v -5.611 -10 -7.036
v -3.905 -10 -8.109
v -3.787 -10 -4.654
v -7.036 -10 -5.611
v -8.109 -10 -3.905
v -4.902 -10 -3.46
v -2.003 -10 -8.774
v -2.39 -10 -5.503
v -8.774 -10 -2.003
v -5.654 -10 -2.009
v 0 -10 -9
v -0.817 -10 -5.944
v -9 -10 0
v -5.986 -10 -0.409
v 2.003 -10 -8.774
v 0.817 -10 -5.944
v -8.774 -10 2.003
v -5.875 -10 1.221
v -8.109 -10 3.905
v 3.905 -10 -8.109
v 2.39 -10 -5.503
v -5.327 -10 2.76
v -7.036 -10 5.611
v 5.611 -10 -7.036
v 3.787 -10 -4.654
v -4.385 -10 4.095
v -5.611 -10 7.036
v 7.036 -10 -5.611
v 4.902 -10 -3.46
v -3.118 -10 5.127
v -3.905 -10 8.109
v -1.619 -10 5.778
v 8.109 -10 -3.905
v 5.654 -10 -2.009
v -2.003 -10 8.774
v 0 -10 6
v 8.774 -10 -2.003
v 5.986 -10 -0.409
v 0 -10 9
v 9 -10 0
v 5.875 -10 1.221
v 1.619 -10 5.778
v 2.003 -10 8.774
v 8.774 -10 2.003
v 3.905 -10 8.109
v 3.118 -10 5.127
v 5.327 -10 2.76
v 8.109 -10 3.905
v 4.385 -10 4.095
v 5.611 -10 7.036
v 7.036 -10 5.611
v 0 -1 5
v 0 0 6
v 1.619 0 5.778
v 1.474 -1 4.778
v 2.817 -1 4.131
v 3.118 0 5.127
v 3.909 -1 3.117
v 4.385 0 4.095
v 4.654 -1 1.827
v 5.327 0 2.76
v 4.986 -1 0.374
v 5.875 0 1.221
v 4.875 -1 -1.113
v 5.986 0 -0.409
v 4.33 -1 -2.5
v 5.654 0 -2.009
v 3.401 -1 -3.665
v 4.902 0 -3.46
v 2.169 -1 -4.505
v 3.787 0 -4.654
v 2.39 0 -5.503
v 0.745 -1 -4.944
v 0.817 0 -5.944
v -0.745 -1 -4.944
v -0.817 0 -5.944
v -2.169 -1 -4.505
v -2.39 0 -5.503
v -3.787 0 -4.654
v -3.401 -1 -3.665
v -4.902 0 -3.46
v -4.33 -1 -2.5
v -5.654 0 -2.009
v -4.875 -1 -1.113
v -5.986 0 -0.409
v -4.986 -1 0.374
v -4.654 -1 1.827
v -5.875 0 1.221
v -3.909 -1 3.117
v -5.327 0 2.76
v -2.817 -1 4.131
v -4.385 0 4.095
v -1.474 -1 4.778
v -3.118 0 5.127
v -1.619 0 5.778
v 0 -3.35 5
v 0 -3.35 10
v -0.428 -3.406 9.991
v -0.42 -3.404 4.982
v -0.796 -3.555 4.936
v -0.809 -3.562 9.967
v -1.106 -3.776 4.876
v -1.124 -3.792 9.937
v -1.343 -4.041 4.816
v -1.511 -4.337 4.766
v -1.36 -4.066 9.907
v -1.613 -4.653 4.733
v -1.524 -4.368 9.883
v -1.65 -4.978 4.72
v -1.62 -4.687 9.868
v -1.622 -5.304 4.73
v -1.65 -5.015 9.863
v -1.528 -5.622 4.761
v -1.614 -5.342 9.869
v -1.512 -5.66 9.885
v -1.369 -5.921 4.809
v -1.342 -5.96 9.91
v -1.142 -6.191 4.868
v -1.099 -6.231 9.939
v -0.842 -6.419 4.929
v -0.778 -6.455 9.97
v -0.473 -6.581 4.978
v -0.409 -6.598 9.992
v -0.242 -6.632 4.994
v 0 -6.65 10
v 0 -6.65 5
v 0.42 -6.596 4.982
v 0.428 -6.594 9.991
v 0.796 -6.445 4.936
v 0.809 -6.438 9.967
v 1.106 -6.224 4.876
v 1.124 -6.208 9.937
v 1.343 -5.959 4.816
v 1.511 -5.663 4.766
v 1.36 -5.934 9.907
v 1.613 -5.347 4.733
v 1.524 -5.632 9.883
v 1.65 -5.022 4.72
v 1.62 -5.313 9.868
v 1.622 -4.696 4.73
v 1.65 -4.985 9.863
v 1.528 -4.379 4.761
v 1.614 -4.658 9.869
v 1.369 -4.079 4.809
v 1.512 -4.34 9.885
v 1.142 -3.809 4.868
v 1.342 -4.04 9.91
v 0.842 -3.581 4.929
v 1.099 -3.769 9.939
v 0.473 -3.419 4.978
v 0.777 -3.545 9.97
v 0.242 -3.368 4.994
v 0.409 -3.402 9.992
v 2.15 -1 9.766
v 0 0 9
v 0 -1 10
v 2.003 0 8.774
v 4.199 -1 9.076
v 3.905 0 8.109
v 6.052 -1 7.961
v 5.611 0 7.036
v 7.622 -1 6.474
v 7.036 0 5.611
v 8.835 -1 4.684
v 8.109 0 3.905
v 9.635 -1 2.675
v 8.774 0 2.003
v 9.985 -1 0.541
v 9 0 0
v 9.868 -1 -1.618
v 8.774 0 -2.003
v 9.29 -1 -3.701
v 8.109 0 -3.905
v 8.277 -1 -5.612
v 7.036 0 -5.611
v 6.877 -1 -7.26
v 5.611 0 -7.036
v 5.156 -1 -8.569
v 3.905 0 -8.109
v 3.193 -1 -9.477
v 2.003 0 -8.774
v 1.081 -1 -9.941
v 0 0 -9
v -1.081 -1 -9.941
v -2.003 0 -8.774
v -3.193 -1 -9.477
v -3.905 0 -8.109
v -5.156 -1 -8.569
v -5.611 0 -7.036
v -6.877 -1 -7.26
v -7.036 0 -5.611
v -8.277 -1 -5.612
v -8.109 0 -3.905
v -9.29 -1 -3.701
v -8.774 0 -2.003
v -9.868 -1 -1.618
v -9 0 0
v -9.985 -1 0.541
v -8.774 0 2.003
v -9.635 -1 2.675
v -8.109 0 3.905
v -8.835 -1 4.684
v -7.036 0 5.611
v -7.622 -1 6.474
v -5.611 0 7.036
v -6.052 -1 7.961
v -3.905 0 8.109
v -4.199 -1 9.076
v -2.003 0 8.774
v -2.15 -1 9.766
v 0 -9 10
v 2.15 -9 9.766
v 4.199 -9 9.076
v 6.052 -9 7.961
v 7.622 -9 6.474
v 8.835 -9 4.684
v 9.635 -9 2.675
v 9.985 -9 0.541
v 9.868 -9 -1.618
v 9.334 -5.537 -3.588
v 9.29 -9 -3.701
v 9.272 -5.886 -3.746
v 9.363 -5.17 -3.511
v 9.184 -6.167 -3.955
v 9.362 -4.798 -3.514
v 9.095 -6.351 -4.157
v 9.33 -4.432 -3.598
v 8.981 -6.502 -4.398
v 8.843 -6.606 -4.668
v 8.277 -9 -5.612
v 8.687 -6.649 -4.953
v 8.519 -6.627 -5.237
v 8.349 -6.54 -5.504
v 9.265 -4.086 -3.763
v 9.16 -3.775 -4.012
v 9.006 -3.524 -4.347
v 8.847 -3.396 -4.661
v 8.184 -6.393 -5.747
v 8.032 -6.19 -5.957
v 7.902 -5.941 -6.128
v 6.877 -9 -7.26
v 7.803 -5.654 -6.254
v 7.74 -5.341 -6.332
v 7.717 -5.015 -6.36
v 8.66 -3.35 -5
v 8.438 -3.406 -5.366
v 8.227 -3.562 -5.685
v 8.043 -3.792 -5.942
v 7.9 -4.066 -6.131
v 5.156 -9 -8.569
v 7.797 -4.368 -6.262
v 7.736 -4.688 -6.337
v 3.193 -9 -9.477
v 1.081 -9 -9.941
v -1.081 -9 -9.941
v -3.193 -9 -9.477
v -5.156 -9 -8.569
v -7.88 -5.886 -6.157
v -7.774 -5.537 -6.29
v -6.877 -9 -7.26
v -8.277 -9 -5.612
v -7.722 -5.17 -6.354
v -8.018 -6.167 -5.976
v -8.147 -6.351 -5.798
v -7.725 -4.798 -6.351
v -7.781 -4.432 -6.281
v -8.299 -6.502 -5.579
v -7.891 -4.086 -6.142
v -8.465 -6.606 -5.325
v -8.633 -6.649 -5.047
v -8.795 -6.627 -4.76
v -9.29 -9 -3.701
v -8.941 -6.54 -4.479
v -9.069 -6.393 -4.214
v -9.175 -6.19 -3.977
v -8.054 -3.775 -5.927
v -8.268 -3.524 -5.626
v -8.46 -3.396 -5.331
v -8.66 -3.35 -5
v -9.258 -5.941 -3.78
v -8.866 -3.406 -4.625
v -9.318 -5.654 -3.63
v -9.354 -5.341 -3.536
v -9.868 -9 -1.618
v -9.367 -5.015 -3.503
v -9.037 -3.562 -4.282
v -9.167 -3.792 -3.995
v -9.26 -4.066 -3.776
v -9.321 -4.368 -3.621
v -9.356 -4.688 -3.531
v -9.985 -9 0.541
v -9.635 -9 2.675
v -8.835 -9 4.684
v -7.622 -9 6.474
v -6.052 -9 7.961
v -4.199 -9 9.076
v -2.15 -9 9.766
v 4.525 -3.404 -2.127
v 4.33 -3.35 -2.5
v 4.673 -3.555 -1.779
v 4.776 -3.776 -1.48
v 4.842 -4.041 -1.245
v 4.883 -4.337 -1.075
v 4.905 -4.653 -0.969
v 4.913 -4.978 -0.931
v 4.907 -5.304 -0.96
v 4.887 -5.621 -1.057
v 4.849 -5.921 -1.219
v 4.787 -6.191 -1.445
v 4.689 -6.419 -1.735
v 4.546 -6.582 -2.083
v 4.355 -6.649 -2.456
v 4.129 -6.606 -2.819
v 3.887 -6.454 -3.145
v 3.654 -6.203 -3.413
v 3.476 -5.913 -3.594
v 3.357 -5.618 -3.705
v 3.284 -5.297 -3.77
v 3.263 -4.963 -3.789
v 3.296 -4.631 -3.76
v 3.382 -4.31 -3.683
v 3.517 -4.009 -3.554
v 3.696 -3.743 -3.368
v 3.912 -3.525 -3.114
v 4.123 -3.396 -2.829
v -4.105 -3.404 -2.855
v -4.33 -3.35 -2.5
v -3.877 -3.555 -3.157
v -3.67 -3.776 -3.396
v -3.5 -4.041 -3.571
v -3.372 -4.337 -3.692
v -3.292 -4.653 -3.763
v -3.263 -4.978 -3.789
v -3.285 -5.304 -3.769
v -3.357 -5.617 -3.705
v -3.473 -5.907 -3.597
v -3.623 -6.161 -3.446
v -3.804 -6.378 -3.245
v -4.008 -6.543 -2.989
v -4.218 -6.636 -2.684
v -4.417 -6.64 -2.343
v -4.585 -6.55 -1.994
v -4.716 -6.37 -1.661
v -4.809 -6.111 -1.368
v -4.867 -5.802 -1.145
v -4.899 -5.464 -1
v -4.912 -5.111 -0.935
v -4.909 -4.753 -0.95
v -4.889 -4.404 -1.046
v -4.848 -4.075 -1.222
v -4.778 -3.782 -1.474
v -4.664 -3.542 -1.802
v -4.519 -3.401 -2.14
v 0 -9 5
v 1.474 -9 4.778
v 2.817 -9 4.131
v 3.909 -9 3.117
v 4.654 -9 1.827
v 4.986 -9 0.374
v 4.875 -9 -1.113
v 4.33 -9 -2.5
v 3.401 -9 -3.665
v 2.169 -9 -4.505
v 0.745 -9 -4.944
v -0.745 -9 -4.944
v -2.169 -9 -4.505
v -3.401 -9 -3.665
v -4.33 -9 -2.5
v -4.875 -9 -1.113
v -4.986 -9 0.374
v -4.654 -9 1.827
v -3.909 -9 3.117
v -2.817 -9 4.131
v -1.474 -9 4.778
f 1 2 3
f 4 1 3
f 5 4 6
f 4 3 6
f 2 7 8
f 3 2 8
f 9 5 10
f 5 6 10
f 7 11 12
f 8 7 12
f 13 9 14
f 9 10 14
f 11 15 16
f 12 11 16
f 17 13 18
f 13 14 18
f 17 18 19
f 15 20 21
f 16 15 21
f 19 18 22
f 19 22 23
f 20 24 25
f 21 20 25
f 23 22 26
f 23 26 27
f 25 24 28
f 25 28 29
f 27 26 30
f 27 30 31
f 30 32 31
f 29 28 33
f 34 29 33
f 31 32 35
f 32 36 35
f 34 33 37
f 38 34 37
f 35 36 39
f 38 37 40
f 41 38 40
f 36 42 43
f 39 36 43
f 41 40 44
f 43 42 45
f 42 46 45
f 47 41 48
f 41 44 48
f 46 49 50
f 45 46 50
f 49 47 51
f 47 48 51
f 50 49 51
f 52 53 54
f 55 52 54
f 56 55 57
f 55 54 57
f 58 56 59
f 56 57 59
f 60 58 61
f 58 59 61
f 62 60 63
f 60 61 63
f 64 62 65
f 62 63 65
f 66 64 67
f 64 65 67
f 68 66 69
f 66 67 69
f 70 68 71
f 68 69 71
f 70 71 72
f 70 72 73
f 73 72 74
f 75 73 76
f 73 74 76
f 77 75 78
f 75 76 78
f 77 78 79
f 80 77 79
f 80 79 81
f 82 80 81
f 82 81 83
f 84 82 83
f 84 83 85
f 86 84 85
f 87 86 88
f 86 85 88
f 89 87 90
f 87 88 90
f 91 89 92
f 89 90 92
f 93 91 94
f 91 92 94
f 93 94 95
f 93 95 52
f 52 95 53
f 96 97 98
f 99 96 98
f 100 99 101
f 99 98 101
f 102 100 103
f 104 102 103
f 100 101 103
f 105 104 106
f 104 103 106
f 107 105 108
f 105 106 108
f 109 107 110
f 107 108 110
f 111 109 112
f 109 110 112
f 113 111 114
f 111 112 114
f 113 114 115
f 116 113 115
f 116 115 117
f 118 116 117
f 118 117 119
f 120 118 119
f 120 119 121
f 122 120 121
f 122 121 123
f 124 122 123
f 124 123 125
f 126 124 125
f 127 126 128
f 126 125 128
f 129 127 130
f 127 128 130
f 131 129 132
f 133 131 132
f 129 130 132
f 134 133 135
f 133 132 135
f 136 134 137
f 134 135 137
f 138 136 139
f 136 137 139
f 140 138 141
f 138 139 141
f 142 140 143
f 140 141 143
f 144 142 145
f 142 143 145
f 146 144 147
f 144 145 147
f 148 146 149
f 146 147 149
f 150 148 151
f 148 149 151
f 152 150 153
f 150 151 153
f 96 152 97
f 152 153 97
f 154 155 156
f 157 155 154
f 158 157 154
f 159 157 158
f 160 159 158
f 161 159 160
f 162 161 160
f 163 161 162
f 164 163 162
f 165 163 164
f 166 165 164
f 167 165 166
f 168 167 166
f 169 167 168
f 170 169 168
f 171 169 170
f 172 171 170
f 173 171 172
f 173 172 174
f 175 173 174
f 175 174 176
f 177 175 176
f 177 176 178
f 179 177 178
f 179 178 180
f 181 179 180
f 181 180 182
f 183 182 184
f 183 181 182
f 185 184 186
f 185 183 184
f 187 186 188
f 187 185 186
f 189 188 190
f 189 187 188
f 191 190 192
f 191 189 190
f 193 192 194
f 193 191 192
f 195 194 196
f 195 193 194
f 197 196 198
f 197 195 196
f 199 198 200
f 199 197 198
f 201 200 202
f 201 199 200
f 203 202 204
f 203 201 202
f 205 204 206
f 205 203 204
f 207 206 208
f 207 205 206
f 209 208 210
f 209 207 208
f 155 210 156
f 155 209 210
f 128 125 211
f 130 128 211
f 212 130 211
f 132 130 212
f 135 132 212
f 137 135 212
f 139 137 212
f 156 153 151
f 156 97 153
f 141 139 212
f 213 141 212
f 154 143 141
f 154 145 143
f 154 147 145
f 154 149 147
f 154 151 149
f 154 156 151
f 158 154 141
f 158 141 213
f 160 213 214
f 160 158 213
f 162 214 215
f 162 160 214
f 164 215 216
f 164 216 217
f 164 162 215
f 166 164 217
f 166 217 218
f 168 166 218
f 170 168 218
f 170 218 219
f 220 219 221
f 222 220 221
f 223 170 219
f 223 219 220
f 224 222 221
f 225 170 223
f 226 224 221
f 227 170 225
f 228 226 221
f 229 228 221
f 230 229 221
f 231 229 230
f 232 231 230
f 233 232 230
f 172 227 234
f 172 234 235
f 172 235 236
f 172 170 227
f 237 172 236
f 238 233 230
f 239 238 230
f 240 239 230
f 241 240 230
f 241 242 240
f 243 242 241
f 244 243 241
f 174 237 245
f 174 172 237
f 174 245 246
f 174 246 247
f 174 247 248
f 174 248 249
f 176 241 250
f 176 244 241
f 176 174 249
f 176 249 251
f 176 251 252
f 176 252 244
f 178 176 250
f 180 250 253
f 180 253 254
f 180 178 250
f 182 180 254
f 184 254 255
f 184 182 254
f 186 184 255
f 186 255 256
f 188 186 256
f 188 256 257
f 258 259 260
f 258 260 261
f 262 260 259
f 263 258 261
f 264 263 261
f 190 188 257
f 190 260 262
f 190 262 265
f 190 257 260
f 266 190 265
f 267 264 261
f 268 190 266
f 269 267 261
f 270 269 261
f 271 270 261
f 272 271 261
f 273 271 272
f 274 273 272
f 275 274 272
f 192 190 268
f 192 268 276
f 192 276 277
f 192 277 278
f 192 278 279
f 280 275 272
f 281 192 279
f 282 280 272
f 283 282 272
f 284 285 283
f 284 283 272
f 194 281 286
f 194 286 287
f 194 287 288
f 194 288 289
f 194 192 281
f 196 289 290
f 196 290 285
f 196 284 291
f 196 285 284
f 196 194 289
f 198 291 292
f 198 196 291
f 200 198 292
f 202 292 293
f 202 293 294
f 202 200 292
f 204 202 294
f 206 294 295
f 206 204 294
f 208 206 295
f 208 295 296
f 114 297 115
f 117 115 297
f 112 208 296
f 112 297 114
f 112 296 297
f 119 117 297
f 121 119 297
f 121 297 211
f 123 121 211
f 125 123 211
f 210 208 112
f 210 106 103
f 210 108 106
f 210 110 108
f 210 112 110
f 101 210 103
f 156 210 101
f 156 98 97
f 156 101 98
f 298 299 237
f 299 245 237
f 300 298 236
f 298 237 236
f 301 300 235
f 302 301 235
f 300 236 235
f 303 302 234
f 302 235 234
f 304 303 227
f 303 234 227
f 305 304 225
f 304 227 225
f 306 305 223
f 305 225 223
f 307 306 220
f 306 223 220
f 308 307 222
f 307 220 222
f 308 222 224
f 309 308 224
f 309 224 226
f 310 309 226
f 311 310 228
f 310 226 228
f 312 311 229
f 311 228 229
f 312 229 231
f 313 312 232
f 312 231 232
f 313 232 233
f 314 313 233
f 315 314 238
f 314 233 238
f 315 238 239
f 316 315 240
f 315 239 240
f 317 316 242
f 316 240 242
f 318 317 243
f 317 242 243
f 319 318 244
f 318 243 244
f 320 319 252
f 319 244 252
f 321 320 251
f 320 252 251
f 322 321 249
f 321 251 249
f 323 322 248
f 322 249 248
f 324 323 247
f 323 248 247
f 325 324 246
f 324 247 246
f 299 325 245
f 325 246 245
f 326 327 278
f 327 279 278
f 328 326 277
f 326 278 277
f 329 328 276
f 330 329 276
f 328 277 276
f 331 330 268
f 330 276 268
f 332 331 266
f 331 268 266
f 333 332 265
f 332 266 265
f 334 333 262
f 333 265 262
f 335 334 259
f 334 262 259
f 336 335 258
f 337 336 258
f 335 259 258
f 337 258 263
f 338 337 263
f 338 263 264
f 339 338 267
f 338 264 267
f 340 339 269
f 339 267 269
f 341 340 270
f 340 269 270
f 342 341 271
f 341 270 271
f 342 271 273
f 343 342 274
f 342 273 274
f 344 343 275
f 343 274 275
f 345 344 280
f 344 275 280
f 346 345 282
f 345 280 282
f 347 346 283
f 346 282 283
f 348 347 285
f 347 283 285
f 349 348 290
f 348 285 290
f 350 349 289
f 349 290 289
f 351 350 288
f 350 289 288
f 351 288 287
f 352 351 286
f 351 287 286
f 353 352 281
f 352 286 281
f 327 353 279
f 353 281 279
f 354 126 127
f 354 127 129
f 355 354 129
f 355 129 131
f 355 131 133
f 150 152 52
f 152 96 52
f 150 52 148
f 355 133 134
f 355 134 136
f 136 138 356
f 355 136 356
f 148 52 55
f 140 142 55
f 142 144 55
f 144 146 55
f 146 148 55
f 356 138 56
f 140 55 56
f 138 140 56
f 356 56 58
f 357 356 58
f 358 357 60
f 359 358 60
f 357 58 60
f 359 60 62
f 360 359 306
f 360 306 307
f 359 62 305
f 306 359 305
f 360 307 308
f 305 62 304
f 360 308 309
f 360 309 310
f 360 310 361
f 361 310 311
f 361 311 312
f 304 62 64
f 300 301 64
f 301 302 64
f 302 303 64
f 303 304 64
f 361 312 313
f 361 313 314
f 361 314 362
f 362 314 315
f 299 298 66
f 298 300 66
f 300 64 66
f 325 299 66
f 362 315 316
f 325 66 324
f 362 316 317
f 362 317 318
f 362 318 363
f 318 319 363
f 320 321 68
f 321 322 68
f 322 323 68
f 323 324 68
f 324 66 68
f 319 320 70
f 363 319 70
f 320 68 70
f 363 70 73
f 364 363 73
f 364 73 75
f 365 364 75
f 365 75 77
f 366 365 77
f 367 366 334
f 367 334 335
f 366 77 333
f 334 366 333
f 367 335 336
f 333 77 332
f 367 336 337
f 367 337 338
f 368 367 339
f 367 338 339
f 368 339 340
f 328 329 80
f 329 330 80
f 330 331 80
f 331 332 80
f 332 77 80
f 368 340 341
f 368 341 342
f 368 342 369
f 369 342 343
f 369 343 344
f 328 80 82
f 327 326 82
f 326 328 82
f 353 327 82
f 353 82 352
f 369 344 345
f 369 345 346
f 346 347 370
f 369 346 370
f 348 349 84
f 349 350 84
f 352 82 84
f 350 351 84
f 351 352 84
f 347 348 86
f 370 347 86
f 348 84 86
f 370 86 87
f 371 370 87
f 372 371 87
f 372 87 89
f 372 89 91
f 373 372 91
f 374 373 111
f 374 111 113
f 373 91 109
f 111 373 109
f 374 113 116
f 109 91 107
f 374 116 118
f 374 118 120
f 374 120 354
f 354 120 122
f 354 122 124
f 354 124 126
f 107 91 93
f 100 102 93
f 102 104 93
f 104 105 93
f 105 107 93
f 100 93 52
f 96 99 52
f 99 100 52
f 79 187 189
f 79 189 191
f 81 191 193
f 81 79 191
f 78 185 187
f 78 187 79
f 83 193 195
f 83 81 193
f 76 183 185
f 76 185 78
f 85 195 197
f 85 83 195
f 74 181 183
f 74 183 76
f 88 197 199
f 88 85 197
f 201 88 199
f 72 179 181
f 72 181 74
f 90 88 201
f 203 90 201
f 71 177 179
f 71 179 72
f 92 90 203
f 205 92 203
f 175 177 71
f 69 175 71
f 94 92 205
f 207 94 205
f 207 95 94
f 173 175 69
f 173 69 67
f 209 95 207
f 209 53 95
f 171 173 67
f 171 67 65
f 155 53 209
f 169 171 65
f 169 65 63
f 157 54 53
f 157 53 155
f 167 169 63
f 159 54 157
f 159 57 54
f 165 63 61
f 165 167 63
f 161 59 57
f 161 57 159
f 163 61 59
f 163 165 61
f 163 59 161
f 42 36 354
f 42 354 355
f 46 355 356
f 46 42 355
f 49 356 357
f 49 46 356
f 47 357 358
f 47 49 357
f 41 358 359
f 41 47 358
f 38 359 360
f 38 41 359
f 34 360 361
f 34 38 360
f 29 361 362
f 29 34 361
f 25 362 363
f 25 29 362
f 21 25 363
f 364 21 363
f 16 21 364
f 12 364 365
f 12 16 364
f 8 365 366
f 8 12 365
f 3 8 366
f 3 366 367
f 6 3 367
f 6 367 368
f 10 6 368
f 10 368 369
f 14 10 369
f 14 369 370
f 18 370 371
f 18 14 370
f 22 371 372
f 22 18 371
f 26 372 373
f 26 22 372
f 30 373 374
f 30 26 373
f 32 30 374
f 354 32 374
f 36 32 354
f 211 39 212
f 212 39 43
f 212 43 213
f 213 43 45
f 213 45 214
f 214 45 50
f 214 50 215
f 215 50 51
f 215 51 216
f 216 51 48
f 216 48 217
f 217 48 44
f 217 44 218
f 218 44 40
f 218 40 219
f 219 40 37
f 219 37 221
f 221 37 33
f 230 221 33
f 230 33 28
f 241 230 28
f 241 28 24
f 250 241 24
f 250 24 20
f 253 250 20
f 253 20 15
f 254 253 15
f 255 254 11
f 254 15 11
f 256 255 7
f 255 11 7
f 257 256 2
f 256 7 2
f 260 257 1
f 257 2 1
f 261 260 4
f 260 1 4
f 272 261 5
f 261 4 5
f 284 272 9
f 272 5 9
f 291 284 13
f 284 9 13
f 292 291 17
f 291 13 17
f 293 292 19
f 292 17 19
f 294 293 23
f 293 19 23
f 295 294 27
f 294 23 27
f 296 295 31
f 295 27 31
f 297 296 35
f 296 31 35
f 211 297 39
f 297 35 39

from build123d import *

# Parameters (mm, degrees)
SKETCH1_R           = 10
SKETCH1_R_2         = 5
BOSS_EXTRUDE1_DEPTH = 10
CHAMFER1_SIZE       = 1
SKETCH3_W           = 1.65
SKETCH3_H           = 10
CIRPATTERN1_COUNT   = 3


with BuildPart() as part:
    # Sketch1 → Boss-Extrude1 (new body)
    with BuildSketch(Plane(origin=(0, 0, 0), x_dir=(1, 0, 0), z_dir=(0, 1, 0))):
        with Locations(Location((0, 0, 0), (0, 0, 270))):
            Circle(SKETCH1_R)
        with Locations(Location((0, 0, 0), (0, 0, 270))):
            Circle(SKETCH1_R_2, mode=Mode.SUBTRACT)
    extrude(amount=-BOSS_EXTRUDE1_DEPTH)

    # Chamfer1
    chamfer1_edges = [part.edges().sort_by_distance(p)[0] for p in [
        (0, 0, -10),
        (0, -10, -10),
        (0, -10, -5),
        (0, 0, -5),
    ]]
    chamfer(chamfer1_edges, length=CHAMFER1_SIZE)

    # Sketch3 → M4 Tapped Hole1 (revolve, cut)
    with BuildSketch(Plane(origin=(0, -5, 0), x_dir=(0, 1, 0), z_dir=(1, 0, 0))):
        with Locations((0.825, 5)):
            Rectangle(SKETCH3_W, SKETCH3_H)
    m4_tapped_hole1 = revolve(axis=Axis((0, -5, -6.35), (0, 0, 1)), mode=Mode.SUBTRACT)

    # CirPattern1: M4 Tapped Hole1 ×3 about axis
    cirpattern1_axis = Axis((0, -1, 0), (0, 1, 0))
    for i in range(1, CIRPATTERN1_COUNT):
        add(m4_tapped_hole1.rotate(cirpattern1_axis, i * 360 / CIRPATTERN1_COUNT), mode=Mode.SUBTRACT)


solid = part.part
